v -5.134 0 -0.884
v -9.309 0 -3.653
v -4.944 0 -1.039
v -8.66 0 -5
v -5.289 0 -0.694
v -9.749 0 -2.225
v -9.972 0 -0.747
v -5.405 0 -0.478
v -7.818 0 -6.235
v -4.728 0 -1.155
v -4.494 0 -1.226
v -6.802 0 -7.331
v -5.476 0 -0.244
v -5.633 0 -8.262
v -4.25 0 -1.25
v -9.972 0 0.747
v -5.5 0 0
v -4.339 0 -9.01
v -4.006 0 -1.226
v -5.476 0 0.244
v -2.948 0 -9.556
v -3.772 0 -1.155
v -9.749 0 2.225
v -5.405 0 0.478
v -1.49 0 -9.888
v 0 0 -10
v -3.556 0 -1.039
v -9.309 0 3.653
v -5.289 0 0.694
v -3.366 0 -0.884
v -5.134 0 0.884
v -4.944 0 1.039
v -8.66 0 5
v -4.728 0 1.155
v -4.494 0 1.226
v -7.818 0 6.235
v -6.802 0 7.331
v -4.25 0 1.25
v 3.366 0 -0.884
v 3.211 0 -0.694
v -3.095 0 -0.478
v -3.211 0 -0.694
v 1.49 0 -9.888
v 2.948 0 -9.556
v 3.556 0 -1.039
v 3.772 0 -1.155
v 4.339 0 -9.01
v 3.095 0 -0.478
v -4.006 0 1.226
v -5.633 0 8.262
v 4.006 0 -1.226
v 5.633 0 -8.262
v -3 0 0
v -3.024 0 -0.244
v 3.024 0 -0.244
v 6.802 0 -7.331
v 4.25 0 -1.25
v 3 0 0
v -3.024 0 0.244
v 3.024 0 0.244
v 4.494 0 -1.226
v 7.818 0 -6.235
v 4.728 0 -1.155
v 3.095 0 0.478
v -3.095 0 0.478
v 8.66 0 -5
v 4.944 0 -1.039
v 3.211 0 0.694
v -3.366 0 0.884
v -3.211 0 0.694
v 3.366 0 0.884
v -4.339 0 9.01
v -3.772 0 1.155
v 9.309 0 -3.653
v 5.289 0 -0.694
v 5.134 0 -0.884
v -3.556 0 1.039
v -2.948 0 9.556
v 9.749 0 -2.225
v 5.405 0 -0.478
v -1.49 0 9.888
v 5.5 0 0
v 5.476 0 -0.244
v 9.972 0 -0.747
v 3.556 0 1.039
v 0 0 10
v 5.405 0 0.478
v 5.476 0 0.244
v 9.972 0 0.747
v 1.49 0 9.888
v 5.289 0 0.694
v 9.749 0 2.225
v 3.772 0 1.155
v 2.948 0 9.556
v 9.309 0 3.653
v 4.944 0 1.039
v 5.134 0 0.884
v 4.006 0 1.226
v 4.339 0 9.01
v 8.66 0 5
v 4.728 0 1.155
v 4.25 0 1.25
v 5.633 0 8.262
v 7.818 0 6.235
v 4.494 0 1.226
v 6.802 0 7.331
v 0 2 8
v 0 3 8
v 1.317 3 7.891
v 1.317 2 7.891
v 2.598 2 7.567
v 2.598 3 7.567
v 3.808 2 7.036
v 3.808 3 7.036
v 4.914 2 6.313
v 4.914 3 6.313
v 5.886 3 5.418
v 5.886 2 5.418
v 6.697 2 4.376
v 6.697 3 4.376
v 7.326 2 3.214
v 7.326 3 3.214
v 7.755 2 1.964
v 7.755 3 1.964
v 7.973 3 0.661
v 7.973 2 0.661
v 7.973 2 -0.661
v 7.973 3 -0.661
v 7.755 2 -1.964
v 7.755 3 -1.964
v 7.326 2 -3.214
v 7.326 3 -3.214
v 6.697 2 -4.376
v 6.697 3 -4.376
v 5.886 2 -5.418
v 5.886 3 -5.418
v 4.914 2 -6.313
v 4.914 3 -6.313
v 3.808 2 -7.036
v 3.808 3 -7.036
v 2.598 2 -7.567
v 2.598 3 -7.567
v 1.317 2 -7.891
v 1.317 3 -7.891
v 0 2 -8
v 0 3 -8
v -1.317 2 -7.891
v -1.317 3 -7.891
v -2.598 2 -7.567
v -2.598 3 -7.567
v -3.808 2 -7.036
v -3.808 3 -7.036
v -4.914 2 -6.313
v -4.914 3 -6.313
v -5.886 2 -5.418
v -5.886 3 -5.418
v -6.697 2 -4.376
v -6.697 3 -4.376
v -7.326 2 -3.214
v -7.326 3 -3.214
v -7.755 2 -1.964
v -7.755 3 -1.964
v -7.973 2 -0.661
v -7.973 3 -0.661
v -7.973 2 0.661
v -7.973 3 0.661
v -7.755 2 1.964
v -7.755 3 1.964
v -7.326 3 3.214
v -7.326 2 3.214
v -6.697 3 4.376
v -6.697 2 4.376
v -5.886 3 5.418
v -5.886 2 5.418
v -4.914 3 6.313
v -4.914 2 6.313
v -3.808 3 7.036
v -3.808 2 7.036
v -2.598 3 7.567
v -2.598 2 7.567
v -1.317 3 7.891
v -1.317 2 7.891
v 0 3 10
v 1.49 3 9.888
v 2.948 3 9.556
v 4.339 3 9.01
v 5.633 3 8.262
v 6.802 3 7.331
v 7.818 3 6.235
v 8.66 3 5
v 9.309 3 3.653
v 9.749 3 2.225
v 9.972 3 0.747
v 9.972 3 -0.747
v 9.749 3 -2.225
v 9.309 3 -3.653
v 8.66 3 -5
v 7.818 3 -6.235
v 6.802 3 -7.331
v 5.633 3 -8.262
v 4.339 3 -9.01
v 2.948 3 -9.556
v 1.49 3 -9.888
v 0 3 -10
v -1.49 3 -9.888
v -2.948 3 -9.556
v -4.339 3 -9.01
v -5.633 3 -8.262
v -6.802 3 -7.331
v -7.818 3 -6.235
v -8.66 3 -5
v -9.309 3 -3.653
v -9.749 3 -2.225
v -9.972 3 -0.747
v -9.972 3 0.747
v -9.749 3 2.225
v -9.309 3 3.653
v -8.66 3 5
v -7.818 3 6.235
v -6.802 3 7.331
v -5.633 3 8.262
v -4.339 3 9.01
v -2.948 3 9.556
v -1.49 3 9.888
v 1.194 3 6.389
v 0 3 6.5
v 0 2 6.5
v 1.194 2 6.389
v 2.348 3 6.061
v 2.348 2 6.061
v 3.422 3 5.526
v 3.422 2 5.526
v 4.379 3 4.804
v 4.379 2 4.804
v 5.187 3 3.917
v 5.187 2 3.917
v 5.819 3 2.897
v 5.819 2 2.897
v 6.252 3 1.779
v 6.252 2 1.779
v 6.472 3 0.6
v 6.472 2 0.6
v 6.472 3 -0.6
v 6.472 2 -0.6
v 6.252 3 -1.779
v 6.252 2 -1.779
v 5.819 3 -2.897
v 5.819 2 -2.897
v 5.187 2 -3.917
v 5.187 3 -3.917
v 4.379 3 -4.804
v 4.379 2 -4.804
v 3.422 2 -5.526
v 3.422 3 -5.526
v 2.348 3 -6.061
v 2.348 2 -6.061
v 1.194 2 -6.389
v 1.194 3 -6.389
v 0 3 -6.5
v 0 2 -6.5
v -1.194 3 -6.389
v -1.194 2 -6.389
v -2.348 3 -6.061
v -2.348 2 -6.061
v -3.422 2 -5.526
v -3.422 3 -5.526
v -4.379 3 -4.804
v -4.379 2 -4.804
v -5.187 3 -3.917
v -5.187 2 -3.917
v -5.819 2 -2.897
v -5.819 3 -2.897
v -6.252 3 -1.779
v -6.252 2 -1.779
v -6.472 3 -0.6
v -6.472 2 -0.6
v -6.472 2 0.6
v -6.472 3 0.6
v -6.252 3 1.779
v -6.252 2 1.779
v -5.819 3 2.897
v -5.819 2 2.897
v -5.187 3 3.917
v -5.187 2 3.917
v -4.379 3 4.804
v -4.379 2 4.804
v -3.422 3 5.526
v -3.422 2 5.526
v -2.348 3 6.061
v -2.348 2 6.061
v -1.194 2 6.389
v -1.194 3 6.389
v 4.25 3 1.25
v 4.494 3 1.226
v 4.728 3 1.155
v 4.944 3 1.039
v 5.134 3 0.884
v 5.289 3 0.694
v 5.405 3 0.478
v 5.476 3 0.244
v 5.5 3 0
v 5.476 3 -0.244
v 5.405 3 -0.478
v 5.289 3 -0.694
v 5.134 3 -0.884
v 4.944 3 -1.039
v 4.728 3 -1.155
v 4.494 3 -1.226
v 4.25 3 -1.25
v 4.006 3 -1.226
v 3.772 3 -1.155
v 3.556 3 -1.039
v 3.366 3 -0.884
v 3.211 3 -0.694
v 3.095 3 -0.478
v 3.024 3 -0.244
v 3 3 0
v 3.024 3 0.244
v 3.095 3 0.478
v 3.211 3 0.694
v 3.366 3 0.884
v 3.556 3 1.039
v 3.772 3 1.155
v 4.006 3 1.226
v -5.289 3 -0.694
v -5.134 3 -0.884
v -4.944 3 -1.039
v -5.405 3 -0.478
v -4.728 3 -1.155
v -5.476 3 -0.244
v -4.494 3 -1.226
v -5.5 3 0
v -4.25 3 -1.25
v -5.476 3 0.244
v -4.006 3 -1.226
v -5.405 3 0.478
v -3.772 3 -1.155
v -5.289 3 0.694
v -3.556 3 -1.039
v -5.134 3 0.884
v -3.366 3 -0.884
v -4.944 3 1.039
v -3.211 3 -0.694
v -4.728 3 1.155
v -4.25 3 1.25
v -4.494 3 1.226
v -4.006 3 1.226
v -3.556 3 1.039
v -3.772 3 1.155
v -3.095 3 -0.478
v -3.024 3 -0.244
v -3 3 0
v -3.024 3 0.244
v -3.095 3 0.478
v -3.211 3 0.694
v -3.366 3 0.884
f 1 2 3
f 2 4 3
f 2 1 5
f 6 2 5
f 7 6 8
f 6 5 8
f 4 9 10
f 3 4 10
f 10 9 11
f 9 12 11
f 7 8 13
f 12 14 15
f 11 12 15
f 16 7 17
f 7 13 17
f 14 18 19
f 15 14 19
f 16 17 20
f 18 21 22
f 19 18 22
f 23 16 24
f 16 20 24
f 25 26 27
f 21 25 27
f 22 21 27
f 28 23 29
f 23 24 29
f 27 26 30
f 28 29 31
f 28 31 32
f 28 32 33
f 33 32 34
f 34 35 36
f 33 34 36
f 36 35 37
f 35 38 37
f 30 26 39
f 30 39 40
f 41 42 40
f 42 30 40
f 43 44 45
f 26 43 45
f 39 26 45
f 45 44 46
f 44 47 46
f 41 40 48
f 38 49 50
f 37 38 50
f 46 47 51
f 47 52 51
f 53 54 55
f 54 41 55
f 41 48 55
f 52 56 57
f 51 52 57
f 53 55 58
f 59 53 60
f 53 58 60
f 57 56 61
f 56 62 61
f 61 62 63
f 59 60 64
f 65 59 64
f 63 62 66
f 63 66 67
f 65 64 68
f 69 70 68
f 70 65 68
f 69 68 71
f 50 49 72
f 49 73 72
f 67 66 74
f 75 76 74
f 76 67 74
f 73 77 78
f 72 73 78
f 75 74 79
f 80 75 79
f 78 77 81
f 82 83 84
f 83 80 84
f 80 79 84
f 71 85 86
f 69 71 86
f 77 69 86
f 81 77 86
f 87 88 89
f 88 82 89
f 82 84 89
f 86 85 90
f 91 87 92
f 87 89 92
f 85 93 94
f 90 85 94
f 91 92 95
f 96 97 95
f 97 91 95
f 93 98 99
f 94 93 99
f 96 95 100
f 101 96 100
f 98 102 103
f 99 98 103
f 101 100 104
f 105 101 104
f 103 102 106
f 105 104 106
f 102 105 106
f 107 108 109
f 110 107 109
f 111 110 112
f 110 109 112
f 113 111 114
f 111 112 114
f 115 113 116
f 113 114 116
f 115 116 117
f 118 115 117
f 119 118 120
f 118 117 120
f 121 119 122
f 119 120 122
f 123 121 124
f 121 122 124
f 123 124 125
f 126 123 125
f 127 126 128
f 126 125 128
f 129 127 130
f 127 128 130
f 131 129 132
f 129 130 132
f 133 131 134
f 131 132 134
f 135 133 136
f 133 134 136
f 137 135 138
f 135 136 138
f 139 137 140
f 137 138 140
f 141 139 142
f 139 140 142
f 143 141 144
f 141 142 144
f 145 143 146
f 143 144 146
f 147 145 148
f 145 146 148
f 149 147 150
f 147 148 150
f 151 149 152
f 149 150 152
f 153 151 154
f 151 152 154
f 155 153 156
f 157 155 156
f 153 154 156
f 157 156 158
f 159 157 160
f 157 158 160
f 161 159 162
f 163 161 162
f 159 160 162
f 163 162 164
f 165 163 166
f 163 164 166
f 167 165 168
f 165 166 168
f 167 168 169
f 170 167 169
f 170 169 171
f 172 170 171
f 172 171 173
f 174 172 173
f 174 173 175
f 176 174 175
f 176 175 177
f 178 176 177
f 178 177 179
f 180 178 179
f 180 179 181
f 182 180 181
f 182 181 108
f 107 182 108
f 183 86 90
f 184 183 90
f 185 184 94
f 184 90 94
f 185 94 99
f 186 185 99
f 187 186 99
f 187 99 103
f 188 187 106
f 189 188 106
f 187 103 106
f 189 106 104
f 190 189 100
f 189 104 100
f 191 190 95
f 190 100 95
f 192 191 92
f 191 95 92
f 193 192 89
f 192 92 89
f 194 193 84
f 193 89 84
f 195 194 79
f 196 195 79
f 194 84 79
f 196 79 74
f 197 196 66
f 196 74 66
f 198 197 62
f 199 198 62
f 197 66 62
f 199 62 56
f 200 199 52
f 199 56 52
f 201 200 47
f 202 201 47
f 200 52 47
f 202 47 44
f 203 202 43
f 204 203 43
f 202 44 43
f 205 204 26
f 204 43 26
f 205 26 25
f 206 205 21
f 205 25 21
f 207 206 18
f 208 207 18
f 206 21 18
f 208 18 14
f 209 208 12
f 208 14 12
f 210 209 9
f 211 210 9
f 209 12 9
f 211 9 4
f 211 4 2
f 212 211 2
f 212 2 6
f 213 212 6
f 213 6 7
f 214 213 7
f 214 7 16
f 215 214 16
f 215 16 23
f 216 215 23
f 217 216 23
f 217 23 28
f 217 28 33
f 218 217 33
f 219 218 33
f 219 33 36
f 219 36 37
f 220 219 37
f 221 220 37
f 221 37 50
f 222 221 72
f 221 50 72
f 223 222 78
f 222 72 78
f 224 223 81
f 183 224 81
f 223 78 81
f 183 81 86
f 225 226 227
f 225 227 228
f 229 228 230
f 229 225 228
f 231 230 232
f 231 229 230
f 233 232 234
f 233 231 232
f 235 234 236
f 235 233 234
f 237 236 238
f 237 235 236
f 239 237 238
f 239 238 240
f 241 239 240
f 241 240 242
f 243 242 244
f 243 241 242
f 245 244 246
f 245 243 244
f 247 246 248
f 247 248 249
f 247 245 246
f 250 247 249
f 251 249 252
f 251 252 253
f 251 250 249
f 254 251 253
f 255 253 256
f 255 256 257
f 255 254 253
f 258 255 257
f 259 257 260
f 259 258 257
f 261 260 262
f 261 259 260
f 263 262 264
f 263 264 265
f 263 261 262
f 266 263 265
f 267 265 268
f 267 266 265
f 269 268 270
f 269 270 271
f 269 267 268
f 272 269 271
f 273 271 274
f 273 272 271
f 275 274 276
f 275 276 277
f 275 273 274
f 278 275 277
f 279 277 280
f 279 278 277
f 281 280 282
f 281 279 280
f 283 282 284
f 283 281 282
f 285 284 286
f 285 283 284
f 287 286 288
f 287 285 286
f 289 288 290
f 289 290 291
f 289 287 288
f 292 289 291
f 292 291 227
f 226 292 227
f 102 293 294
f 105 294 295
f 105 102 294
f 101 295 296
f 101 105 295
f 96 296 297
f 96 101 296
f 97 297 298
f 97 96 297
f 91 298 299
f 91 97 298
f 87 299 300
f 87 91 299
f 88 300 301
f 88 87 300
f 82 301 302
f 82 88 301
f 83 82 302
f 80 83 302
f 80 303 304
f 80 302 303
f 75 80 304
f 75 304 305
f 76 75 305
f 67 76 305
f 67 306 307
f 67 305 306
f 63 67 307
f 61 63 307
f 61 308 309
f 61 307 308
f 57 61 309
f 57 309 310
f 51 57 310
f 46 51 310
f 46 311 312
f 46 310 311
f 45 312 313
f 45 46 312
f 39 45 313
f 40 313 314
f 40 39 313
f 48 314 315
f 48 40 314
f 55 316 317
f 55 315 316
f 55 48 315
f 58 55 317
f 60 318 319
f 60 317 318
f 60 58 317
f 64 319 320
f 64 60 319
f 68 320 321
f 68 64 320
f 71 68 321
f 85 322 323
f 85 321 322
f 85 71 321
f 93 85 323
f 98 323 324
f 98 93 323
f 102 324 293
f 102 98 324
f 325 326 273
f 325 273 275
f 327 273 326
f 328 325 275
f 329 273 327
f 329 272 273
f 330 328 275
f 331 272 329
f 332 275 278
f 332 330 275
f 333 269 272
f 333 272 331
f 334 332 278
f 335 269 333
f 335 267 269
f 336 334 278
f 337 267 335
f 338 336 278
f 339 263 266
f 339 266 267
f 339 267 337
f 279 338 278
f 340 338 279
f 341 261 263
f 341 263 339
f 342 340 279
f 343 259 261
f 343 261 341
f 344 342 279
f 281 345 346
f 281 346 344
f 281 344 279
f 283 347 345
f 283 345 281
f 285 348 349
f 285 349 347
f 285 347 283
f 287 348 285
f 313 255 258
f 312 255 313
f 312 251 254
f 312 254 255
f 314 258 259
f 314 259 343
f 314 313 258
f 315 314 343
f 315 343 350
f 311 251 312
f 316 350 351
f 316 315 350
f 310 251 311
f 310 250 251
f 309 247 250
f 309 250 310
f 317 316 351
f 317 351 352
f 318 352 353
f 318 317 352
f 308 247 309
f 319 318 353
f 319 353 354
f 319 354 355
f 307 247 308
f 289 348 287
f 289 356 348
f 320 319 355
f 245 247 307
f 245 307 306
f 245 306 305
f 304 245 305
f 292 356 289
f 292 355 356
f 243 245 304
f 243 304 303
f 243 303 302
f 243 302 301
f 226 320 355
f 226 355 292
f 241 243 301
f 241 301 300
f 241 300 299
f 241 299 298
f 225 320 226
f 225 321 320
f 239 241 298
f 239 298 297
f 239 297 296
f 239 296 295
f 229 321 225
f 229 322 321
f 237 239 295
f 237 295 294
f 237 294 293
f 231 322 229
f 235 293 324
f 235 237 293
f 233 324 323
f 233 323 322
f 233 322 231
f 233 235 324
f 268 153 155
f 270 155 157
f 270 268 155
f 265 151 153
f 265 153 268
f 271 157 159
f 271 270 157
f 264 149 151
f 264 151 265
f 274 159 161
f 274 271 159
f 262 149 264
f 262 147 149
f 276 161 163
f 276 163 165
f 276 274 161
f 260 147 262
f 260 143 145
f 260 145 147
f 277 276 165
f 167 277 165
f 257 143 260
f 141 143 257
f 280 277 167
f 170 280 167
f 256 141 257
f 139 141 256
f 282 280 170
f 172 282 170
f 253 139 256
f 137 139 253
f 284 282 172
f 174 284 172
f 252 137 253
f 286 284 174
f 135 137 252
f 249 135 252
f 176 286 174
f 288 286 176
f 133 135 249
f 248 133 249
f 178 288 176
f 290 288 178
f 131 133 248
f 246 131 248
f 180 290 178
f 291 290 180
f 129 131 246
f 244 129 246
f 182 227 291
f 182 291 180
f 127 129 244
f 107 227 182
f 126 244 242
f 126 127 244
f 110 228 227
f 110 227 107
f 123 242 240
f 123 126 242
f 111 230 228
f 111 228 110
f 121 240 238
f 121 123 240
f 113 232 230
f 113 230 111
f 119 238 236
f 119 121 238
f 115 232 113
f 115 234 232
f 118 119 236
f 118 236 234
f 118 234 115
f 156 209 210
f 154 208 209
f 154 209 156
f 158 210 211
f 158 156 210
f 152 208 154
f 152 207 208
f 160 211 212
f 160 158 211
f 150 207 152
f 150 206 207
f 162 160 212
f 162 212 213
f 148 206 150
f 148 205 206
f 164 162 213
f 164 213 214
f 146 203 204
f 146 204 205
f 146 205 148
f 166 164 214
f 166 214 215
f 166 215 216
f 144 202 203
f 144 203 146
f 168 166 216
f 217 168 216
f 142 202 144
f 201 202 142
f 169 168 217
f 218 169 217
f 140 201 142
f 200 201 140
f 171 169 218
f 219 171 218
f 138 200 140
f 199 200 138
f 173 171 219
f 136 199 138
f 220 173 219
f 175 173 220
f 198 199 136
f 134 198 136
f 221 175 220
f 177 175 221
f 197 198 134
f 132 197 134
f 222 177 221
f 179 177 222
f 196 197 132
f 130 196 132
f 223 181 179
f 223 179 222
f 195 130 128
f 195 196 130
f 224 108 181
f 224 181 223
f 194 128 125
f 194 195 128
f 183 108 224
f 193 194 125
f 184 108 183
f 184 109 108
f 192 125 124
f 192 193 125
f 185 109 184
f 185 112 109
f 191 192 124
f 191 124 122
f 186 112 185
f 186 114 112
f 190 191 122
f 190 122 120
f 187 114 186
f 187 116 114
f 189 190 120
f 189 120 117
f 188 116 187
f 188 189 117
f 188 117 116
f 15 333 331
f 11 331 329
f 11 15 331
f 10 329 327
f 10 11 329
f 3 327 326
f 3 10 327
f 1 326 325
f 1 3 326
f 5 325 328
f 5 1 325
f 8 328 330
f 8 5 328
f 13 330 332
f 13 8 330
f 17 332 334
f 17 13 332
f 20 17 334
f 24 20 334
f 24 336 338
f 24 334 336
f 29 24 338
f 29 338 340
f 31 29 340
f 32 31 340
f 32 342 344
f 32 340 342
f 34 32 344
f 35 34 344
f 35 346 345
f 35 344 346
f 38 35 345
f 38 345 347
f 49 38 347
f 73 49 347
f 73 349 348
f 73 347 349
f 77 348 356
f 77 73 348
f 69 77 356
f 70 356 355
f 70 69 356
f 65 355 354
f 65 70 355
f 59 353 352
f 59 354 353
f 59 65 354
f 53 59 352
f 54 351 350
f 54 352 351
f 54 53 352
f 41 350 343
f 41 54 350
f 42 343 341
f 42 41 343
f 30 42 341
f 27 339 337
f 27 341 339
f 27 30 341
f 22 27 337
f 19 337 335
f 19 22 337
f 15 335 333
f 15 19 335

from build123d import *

# Parameters (mm, degrees)
SKETCH1_R           = 10
BOSS_EXTRUDE1_DEPTH = 3
SKETCH3_R           = 8
SKETCH3_R_2         = 6.5
CUT_EXTRUDE1_DEPTH  = 1
SKETCH4_R           = 1.25
CUT_EXTRUDE2_DEPTH  = 15.456832295


with BuildPart() as part:
    # Sketch1 → Boss-Extrude1 (new body)
    with BuildSketch(Plane(origin=(0, 0, 0), x_dir=(1, 0, 0), z_dir=(0, 1, 0))):
        with Locations(Location((0, 0, 0), (0, 0, 270))):
            Circle(SKETCH1_R)
    extrude(amount=BOSS_EXTRUDE1_DEPTH)

    # Sketch3 → Cut-Extrude1 (cut)
    with BuildSketch(Plane(origin=(0, 3, 0), x_dir=(1, 0, 0), z_dir=(0, 1, 0))):
        with Locations(Location((0, 0, 0), (0, 0, 270))):
            Circle(SKETCH3_R)
        with Locations(Location((0, 0, 0), (0, 0, 270))):
            Circle(SKETCH3_R_2, mode=Mode.SUBTRACT)
    extrude(amount=-CUT_EXTRUDE1_DEPTH, mode=Mode.SUBTRACT)

    # Sketch4 → Cut-Extrude2 (cut, through all)
    with BuildSketch(Plane(origin=(0, 0, 0), x_dir=(1, 0, 0), z_dir=(0, 1, 0))):
        with Locations(Location((4.25, 0, 0), (0, 0, 270))):
            Circle(SKETCH4_R)
        with Locations(Location((-4.25, 0, 0), (0, 0, 90))):
            Circle(SKETCH4_R)
    extrude(amount=CUT_EXTRUDE2_DEPTH, mode=Mode.SUBTRACT)


solid = part.part
